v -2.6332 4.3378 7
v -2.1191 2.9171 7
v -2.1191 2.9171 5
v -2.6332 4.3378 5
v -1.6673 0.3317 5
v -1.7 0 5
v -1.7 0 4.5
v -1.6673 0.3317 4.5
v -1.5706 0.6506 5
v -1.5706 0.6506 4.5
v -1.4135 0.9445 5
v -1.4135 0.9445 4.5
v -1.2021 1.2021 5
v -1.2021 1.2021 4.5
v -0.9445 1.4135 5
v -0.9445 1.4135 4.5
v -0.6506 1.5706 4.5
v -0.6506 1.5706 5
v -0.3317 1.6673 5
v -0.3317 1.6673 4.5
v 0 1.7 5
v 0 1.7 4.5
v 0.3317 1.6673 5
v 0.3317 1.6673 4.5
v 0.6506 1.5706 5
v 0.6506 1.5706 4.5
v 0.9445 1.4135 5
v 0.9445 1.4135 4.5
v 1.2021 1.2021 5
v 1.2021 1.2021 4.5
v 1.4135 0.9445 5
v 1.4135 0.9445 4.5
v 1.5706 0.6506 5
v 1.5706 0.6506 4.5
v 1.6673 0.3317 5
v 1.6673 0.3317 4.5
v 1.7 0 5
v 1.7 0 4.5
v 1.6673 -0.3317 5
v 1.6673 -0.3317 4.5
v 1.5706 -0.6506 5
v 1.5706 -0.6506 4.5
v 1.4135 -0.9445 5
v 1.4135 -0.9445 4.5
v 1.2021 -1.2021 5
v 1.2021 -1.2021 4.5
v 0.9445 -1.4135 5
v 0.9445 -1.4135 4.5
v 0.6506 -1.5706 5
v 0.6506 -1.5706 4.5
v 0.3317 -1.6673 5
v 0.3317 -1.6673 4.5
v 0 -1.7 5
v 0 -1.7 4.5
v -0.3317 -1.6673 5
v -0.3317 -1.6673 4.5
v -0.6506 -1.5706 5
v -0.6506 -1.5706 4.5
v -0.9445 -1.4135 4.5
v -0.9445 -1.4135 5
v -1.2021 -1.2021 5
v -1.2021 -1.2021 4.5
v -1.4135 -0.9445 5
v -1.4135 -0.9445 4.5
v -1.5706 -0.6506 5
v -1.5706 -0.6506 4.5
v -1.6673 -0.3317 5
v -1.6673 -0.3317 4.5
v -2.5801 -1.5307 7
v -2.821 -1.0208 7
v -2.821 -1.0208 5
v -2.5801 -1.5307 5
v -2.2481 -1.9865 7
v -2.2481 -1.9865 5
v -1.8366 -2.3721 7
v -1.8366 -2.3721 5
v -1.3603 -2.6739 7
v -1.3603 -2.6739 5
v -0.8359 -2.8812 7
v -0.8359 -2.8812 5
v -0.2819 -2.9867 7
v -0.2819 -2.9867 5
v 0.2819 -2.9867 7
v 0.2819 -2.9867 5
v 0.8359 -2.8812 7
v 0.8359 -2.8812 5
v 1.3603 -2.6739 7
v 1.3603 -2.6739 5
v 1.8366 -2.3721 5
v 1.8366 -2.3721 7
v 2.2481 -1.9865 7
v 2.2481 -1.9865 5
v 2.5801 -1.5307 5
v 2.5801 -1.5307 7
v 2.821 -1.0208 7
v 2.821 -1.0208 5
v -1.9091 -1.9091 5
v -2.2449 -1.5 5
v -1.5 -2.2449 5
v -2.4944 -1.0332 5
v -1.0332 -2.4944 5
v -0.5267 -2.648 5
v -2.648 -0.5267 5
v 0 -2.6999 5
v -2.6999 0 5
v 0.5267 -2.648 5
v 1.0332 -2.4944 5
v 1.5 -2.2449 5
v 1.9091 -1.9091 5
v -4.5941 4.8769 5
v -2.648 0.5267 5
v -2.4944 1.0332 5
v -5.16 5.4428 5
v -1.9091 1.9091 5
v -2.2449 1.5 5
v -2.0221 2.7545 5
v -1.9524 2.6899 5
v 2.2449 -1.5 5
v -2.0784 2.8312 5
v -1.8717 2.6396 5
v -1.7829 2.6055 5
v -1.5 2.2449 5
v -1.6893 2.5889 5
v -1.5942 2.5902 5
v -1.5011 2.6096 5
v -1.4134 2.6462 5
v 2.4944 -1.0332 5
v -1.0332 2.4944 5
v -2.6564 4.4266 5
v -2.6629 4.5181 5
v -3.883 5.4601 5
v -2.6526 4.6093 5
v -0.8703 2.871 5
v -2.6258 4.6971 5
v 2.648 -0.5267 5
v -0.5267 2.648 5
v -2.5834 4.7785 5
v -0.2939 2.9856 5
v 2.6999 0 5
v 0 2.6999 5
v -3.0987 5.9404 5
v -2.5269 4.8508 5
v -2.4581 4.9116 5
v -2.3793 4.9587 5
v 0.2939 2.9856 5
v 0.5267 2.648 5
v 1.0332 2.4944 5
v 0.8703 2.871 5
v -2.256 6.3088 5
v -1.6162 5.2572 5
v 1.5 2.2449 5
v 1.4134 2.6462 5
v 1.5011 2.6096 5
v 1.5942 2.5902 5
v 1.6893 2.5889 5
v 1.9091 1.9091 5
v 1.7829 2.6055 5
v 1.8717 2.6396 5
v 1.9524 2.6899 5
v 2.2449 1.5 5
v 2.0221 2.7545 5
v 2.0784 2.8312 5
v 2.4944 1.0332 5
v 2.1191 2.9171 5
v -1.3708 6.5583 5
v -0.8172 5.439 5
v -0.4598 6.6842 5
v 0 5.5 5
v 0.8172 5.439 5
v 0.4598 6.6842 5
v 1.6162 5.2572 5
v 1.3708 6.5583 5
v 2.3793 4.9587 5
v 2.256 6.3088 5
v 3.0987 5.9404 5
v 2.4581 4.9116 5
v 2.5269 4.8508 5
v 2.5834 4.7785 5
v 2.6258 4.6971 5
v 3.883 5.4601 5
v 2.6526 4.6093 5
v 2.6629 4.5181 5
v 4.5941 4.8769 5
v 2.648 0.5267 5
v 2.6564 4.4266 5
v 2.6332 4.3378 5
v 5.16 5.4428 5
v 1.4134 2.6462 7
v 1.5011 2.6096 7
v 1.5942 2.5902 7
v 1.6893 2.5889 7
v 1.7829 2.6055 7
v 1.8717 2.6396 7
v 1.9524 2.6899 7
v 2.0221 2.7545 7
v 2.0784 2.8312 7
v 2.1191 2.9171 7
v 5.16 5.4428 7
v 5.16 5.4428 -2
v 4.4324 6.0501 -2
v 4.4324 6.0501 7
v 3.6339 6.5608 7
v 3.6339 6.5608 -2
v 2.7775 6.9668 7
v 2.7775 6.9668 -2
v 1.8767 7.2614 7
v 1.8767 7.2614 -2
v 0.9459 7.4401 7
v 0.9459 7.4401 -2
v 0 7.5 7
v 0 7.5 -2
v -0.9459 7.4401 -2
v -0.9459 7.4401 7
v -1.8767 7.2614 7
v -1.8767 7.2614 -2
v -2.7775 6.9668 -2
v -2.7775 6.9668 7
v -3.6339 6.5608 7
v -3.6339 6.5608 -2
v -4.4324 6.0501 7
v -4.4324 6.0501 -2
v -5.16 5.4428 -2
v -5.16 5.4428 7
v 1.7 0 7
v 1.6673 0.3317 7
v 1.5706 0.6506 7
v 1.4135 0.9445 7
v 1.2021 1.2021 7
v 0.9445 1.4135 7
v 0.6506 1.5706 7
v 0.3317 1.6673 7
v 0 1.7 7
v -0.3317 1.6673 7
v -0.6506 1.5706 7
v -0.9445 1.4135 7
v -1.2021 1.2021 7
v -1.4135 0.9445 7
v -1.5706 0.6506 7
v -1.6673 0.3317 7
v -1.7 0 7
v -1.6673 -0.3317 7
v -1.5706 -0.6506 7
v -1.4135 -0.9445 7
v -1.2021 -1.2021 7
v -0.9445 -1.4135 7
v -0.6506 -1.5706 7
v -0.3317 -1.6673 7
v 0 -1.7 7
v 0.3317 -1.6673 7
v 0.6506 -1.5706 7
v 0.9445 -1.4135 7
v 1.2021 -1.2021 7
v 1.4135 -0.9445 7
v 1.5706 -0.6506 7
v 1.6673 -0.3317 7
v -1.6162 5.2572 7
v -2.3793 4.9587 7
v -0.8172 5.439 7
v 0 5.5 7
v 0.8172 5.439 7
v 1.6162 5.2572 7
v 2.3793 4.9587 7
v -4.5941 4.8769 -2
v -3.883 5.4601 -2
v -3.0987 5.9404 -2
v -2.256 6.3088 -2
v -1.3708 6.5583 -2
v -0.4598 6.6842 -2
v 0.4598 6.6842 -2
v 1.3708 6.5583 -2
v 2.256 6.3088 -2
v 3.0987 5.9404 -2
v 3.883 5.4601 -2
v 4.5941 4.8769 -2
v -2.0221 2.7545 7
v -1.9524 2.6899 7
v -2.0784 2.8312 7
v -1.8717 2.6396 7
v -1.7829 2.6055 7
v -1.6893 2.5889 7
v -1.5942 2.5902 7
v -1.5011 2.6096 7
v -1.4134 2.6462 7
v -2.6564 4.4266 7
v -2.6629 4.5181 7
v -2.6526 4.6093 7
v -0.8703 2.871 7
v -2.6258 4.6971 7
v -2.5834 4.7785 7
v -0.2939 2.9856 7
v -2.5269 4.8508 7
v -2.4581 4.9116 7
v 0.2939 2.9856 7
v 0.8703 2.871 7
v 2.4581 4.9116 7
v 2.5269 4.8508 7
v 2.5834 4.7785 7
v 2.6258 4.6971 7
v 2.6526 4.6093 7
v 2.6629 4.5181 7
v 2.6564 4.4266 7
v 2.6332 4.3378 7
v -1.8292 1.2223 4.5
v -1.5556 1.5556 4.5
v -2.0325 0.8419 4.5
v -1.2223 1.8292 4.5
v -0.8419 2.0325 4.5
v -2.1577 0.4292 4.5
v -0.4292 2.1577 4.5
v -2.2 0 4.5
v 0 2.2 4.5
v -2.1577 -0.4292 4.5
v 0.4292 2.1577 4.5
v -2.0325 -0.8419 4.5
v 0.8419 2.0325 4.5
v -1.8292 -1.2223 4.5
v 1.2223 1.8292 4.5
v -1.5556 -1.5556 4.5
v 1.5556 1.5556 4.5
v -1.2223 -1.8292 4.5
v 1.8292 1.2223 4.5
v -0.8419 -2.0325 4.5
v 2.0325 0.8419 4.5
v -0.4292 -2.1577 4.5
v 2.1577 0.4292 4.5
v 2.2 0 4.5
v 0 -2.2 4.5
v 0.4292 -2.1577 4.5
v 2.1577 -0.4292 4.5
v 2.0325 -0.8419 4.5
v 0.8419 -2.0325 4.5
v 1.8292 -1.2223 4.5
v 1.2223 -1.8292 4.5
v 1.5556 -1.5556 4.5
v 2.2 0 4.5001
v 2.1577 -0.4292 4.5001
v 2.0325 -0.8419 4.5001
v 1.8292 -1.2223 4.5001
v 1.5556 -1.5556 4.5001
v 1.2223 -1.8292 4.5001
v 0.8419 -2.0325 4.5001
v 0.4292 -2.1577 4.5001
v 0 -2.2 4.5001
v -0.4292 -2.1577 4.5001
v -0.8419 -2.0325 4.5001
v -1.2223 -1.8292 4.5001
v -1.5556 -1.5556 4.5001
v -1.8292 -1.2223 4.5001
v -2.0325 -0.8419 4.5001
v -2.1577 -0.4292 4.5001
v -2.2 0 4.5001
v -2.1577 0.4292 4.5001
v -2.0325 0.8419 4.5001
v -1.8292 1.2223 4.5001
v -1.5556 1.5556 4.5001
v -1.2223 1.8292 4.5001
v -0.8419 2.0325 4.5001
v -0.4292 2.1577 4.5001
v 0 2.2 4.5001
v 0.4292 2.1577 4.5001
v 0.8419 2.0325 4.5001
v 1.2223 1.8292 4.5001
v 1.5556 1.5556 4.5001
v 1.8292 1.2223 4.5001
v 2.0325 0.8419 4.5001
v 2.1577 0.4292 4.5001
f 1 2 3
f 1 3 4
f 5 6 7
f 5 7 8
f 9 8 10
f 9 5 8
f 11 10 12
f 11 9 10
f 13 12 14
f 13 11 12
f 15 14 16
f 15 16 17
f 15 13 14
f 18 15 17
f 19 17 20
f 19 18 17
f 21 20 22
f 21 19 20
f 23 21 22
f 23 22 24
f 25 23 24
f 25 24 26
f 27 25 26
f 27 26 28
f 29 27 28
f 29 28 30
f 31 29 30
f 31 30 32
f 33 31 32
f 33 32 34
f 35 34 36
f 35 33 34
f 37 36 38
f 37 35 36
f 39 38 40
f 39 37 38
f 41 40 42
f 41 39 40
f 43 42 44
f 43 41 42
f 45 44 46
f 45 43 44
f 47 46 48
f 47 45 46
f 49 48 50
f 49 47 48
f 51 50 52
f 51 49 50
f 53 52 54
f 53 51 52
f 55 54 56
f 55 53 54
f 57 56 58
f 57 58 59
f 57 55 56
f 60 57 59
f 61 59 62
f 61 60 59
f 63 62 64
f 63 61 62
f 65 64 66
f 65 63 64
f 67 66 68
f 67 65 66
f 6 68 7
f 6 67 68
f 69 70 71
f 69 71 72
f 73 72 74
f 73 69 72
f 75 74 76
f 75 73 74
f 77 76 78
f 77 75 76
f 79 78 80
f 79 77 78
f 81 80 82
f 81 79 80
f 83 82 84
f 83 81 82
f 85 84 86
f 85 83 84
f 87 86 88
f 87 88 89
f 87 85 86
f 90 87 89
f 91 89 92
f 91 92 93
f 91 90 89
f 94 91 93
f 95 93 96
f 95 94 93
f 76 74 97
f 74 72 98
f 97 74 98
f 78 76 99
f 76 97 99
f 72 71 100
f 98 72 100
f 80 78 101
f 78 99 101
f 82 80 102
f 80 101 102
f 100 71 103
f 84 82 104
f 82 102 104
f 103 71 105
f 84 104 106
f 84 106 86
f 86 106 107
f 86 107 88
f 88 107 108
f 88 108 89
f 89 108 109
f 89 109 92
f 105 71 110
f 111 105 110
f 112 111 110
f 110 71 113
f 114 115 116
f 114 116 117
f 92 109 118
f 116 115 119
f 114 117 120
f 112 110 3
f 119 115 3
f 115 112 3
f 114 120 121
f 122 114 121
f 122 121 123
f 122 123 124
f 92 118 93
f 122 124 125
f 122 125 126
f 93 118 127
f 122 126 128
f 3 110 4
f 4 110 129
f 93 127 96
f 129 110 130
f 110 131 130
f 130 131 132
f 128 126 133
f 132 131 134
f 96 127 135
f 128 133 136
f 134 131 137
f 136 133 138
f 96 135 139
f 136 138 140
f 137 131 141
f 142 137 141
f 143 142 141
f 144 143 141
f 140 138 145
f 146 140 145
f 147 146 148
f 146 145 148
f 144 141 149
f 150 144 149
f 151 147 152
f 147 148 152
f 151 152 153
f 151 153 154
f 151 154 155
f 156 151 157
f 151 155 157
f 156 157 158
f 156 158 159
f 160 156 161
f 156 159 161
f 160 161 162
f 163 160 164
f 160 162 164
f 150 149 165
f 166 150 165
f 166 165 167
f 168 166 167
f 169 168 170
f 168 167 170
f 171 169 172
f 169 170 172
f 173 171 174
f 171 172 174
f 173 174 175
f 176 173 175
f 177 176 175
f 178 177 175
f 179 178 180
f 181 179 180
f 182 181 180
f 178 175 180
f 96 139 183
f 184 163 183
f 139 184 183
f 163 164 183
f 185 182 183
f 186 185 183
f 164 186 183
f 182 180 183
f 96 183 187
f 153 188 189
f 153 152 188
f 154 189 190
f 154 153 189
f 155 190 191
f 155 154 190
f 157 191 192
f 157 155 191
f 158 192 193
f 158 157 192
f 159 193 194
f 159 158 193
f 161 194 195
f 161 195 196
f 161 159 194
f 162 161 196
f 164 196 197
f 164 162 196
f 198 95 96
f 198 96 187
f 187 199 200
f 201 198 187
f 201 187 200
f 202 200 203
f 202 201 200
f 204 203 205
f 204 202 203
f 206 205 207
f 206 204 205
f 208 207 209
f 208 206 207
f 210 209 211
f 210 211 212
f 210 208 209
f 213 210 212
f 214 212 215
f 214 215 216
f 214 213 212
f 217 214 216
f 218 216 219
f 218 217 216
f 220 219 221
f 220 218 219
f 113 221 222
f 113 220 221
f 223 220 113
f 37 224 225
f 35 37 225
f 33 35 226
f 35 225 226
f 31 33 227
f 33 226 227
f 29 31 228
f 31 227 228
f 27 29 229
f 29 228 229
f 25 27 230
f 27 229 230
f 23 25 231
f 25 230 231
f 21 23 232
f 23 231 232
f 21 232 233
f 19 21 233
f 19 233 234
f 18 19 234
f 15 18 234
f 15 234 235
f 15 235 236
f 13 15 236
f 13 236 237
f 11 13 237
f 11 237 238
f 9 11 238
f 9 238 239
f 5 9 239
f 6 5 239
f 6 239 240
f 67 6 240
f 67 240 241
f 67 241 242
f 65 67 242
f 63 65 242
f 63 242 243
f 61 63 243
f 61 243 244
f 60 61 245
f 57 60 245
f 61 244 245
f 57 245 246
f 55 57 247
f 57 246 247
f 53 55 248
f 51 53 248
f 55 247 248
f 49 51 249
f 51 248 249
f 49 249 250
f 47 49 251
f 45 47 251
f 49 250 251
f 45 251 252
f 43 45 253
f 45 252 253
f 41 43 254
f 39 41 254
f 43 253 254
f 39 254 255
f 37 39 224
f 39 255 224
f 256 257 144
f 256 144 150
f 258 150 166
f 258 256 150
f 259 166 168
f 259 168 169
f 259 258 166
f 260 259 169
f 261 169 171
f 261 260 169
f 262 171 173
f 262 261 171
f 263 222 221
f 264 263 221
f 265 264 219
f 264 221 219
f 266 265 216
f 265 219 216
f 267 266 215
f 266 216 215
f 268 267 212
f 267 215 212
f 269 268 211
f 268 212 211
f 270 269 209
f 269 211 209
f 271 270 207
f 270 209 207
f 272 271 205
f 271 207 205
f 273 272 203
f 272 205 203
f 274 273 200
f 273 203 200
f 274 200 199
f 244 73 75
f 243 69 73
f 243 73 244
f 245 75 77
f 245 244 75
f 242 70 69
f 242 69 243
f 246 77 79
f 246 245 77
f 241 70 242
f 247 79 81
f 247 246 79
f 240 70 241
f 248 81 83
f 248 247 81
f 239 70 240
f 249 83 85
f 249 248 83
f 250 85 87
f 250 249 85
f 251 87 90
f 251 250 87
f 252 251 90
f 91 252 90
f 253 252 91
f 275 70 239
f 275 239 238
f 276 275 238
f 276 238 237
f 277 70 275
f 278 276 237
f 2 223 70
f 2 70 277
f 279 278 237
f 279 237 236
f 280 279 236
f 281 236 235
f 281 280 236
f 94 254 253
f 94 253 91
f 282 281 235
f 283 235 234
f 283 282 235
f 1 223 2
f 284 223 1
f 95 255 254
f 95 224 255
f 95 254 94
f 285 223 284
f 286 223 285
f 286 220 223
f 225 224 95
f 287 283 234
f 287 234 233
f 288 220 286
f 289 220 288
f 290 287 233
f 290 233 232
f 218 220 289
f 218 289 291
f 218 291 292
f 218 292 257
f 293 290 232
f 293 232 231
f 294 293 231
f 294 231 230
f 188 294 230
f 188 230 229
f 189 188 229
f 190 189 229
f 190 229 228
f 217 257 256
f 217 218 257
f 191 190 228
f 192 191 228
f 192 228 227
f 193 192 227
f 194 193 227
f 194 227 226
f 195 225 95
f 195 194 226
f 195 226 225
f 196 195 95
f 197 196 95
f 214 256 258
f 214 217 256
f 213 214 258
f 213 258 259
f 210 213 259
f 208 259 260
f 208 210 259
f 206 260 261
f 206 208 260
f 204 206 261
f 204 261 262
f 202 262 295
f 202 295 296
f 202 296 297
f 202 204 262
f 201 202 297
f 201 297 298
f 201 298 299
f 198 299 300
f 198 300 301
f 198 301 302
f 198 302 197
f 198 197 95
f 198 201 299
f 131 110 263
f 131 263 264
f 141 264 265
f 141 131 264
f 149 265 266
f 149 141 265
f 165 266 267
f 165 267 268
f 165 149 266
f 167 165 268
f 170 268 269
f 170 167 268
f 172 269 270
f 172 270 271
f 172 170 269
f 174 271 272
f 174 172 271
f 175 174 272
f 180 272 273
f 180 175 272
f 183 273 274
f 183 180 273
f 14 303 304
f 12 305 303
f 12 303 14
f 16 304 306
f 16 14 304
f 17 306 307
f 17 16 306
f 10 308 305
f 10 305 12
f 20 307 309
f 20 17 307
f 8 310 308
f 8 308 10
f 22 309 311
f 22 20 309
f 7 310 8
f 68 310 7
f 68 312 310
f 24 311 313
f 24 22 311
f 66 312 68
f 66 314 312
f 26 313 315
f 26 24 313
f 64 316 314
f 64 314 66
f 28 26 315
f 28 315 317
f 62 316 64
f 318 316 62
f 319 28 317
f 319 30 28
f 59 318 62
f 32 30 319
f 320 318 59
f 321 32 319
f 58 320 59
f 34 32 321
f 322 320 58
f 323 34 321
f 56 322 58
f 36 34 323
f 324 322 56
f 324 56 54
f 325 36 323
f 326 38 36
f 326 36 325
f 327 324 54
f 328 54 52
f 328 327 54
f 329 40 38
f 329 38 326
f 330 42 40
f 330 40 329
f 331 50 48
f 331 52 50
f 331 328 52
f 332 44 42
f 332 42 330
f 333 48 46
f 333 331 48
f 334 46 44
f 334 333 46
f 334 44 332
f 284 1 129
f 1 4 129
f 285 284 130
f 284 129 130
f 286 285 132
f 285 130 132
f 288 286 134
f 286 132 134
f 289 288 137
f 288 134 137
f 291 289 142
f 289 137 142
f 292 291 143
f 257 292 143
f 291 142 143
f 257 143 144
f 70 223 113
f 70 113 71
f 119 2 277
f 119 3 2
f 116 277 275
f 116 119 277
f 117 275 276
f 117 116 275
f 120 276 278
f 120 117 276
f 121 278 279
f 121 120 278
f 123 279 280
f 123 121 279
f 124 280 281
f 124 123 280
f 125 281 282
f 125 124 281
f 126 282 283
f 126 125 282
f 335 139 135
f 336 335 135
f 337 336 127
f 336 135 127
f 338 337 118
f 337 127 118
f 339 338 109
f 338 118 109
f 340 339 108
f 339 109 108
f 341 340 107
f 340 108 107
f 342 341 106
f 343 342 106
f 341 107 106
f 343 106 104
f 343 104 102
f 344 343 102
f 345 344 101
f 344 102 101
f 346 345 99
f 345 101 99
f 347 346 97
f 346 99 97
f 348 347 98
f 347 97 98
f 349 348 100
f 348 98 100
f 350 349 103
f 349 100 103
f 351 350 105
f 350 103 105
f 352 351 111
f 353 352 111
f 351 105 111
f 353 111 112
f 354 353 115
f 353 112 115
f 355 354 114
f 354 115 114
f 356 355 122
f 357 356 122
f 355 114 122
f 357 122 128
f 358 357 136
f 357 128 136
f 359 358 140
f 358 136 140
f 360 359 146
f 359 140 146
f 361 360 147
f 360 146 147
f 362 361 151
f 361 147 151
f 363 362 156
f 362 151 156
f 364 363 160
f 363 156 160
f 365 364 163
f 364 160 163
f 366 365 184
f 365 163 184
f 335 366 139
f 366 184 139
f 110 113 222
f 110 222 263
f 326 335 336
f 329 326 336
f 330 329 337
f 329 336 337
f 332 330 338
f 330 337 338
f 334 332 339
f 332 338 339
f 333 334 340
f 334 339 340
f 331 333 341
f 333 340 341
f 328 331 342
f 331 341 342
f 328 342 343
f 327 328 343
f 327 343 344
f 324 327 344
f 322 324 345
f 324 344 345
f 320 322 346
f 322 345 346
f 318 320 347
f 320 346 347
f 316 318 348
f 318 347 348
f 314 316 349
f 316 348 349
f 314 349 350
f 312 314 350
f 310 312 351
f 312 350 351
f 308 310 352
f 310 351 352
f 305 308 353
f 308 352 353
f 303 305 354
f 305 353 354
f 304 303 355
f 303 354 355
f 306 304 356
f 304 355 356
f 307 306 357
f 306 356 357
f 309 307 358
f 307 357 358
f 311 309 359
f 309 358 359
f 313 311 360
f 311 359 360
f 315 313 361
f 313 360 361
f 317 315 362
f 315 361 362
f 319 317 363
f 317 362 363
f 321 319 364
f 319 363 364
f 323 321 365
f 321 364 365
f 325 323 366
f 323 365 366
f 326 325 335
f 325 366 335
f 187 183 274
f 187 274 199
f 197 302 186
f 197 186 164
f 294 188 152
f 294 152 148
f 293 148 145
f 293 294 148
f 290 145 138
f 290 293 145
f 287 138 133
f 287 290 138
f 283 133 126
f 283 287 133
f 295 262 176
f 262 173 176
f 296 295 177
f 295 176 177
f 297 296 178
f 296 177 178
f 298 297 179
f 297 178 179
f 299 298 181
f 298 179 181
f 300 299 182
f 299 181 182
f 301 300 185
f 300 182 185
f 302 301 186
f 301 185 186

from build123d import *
from build123d.topology import SkipClean

# Parameters (mm, degrees)
BOSS_EXTRUDE1_DEPTH = 2
BOSS_EXTRUDE2_START = 5
BOSS_EXTRUDE2_DEPTH = 5
BOSS_EXTRUDE3_START = 2
SKETCH3_R           = 3
SKETCH3_R_2         = 1.7
BOSS_EXTRUDE3_DEPTH = 2
SKETCH4_R           = 2.2
SKETCH4_R_2         = 1.7
BOSS_EXTRUDE4_DEPTH = 0.5
CHAMFER1_SIZE       = 0.5
FILLET1_R           = 0.5


with BuildPart() as part:
    # Sketch1 → Boss-Extrude1 (new body)
    with BuildSketch(Plane.XY):
        with BuildLine():
            Line((4.594082841, 4.876925553), (5.159993549, 5.442836262))
            ThreePointArc((5.159993549, 5.442836262), (0, 7.5), (-5.159993549, 5.442836262))
            Line((-5.159993549, 5.442836262), (-4.594082841, 4.876925553))
            ThreePointArc((-4.594082841, 4.876925553), (0, 6.7), (4.594082841, 4.876925553))
        make_face()
    extrude(amount=-BOSS_EXTRUDE1_DEPTH)

    # Sketch1<3> → Boss-Extrude2 (add)
    with BuildSketch(Plane.XY.offset(BOSS_EXTRUDE2_START)):
        with BuildLine():
            Line((4.594082841, 4.876925553), (5.159993549, 5.442836262))
            ThreePointArc((5.159993549, 5.442836262), (0, 7.5), (-5.159993549, 5.442836262))
            Line((-5.159993549, 5.442836262), (-4.594082841, 4.876925553))
            ThreePointArc((-4.594082841, 4.876925553), (0, 6.7), (4.594082841, 4.876925553))
        make_face()
    extrude(amount=-BOSS_EXTRUDE2_DEPTH)

    # Sketch3 → Boss-Extrude3 (add)
    # profile 1 of 3: a face of its own
    with BuildSketch(Plane.XY.offset(5).offset(BOSS_EXTRUDE3_START)):
        with BuildLine():
            Line((-4.594082841, 4.876925553), (-5.159993549, 5.442836262))
            Line((-5.159993549, 5.442836262), (-2.820975701, -1.02083108))
            ThreePointArc((-2.820975701, -1.02083108), (-2.892694114, 0.795185994), (-1.902774006, 2.31936437))
            Line((-1.902774006, 2.31936437), (-2.780654635, 4.745309242))
            ThreePointArc((-2.780654635, 4.745309242), (0, 5.5), (2.780654635, 4.745309242))
            Line((2.780654635, 4.745309242), (1.902774006, 2.31936437))
            ThreePointArc((1.902774006, 2.31936437), (2.711855639, 1.282902565), (3, 0))
            ThreePointArc((3, 0), (2.954904999, -0.518205025), (2.820975701, -1.02083108))
            Line((2.820975701, -1.02083108), (5.159993549, 5.442836262))
            Line((5.159993549, 5.442836262), (4.594082841, 4.876925553))
            ThreePointArc((4.594082841, 4.876925553), (0, 6.7), (-4.594082841, 4.876925553))
        make_face()
    # profile 2 of 3: a face of its own
    with BuildSketch(Plane.XY.offset(5).offset(BOSS_EXTRUDE3_START)):
        with BuildLine():
            Line((-5.159993549, 5.442836262), (-4.594082841, 4.876925553))
            ThreePointArc((-4.594082841, 4.876925553), (0, 6.7), (4.594082841, 4.876925553))
            Line((4.594082841, 4.876925553), (5.159993549, 5.442836262))
            ThreePointArc((5.159993549, 5.442836262), (0, 7.5), (-5.159993549, 5.442836262))
        make_face()
    # profile 3 of 3: a face of its own
    with BuildSketch(Plane.XY.offset(5).offset(BOSS_EXTRUDE3_START)):
        Circle(SKETCH3_R)
        Circle(SKETCH3_R_2, mode=Mode.SUBTRACT)
    extrude(amount=-BOSS_EXTRUDE3_DEPTH)

    # Sketch4 → Boss-Extrude4 (add)
    with SkipClean():  # the faces are left unmerged after this step: merging them gives an invalid solid
        with BuildSketch(Plane(origin=(0, 0, 5), x_dir=(-1, 0, 0), z_dir=(0, 0, -1))):
            with Locations(Location((0, 0, 0), (0, 0, 180))):
                Circle(SKETCH4_R)
            Circle(SKETCH4_R_2, mode=Mode.SUBTRACT)
        extrude(amount=BOSS_EXTRUDE4_DEPTH)
    add(part.part.scale(1), mode=Mode.REPLACE)  # the faces are merged on a copy

    # Chamfer1
    chamfer1_edges = [part.edges().sort_by_distance(p)[0] for p in [
        (-2.2, 0, 5),
    ]]
    chamfer(chamfer1_edges, length=CHAMFER1_SIZE - 0.0001)  # a hair under: the kernel refuses the full size

    # Fillet1
    fillet1_edges = [part.edges().sort_by_distance(p)[0] for p in [
        (2.780654635, 4.745309242, 6),
        (1.902774006, 2.31936437, 6),
        (-1.902774006, 2.31936437, 6),
        (-2.780654635, 4.745309242, 6),
    ]]
    fillet(fillet1_edges, radius=FILLET1_R)


solid = part.part
